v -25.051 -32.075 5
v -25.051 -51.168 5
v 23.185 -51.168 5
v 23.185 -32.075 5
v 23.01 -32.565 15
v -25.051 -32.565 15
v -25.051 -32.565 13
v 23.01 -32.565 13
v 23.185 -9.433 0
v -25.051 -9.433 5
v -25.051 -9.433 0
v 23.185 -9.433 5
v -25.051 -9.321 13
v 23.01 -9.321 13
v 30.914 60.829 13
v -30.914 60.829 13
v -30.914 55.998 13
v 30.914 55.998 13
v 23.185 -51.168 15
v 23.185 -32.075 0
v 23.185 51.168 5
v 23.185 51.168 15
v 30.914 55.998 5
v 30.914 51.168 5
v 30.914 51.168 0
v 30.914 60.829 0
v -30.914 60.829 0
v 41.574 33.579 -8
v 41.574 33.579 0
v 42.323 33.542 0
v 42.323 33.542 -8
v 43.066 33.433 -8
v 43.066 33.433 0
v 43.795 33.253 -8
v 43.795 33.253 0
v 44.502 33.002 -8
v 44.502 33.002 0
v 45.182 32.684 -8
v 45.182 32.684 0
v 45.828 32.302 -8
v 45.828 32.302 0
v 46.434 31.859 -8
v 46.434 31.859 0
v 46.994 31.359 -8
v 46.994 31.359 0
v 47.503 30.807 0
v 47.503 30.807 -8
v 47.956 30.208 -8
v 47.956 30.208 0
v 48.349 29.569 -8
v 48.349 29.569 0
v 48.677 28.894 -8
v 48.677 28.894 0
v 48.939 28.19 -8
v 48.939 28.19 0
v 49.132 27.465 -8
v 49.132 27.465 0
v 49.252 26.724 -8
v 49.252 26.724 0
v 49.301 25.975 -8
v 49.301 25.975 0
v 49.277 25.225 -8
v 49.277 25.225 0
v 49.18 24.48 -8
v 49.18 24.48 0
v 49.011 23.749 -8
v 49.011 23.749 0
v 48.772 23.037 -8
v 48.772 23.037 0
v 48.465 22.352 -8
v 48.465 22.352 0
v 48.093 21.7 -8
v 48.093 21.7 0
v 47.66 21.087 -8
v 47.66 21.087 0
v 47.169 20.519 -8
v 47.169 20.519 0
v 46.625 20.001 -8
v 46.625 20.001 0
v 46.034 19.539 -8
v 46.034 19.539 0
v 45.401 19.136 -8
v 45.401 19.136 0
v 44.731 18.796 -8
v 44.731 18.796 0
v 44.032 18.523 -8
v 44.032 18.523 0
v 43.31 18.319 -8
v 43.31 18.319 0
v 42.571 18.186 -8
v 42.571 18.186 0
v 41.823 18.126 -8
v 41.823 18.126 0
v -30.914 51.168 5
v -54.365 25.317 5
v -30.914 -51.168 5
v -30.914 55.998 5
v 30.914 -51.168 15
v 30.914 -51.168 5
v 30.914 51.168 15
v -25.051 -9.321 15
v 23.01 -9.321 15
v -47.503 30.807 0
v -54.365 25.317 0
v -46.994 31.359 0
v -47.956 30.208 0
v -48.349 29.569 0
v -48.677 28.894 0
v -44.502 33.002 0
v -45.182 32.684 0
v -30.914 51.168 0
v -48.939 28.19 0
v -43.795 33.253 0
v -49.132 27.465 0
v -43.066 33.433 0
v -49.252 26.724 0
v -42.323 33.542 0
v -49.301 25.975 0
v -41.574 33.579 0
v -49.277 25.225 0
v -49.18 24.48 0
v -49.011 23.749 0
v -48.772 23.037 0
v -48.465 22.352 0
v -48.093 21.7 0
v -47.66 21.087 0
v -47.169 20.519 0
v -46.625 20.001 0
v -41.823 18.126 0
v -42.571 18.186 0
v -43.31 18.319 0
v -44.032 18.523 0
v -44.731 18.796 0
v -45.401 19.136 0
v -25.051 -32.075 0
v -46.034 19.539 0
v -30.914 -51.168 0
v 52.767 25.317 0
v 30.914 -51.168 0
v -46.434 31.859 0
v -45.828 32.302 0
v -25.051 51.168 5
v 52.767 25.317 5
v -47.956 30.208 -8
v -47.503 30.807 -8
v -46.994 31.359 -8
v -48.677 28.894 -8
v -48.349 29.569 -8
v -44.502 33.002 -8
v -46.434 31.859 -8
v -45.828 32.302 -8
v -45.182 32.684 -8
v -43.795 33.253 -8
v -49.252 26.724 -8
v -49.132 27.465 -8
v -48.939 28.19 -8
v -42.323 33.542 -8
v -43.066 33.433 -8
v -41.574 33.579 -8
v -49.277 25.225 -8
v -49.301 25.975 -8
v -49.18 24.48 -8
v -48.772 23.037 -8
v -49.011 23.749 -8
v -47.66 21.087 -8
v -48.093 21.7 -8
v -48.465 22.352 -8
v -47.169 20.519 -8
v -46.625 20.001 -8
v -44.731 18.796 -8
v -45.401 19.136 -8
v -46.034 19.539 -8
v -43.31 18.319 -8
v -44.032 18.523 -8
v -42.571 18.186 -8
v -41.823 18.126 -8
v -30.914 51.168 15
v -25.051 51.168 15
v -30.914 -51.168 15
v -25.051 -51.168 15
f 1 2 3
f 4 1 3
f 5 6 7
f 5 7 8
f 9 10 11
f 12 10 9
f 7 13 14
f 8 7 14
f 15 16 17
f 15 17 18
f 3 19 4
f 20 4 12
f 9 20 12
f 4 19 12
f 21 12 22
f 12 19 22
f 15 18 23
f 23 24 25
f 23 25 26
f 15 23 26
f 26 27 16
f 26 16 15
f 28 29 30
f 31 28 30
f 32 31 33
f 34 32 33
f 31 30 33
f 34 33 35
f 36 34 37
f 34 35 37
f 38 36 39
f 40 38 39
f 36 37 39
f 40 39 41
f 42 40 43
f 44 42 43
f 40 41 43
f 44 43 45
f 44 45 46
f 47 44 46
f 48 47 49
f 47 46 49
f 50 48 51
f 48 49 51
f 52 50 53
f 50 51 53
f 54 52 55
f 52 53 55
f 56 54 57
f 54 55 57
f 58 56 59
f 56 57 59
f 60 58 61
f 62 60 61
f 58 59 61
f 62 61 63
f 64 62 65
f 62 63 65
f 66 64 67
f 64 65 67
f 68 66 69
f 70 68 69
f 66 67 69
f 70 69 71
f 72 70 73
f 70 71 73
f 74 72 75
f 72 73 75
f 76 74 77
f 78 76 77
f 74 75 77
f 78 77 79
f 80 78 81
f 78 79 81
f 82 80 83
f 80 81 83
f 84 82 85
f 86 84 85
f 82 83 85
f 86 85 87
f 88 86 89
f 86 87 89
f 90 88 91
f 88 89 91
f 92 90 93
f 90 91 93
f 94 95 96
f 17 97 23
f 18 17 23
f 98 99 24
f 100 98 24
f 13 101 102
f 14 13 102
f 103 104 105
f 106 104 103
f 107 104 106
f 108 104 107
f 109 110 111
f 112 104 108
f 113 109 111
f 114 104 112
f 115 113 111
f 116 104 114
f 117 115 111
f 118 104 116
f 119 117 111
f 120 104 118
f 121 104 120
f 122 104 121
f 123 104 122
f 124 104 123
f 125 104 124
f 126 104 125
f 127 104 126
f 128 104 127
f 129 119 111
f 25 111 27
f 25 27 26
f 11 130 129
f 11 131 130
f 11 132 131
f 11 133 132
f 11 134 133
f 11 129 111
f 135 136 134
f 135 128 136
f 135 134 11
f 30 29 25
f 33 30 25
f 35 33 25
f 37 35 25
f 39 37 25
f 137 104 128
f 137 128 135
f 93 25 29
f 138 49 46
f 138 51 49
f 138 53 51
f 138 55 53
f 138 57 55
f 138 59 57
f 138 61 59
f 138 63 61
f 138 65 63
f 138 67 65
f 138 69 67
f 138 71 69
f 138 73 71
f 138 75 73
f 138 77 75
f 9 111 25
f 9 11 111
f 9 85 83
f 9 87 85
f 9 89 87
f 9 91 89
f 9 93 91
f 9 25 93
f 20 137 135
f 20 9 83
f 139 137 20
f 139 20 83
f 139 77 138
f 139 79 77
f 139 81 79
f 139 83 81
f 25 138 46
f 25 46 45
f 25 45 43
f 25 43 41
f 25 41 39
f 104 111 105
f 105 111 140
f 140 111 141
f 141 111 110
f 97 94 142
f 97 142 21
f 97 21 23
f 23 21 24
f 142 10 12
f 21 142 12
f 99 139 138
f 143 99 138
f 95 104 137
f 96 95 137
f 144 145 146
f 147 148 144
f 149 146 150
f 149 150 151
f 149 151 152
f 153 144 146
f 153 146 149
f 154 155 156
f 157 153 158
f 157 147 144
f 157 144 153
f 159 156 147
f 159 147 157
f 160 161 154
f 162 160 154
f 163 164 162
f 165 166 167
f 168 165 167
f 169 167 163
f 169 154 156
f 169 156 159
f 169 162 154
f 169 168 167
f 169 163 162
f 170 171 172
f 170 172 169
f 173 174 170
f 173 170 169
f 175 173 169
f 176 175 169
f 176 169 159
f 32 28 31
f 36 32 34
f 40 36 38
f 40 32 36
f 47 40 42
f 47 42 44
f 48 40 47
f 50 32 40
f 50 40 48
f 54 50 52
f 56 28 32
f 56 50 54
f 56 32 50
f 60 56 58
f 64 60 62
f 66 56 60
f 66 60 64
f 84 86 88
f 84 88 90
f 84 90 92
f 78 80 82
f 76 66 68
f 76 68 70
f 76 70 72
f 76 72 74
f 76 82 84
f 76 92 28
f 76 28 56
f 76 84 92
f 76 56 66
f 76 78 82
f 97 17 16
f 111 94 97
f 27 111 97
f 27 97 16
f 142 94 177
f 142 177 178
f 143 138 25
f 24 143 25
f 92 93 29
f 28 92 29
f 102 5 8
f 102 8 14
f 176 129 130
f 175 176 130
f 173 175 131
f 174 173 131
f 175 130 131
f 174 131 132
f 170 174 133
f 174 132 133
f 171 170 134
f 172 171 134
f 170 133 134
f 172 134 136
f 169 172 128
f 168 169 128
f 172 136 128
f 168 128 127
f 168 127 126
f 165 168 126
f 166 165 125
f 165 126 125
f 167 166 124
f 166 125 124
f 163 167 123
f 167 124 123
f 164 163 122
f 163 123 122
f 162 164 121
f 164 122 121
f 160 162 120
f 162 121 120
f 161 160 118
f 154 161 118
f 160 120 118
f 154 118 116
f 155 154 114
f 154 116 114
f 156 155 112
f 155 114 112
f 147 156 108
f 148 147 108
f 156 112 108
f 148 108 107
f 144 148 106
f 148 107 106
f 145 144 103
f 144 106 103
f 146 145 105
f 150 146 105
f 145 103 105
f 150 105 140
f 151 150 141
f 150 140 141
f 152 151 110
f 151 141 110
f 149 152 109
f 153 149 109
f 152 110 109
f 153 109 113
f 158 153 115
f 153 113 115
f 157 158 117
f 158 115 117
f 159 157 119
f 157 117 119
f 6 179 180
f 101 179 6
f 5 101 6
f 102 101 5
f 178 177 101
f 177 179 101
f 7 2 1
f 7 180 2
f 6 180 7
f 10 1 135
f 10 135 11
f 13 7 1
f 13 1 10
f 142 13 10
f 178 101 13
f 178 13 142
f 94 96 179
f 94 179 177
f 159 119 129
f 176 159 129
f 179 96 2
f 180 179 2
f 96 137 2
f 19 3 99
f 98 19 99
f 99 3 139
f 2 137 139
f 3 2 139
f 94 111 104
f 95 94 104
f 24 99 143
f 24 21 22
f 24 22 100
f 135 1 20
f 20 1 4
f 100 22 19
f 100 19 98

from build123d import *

# Parameters (mm, degrees)
F0_W      = 61.827414
F0_H      = 102.335028
F1_DEPTH  = 5
F2_W      = 5.862944
F2_H      = 102.335028
F2_W_2    = 7.728428
F3_DEPTH  = 10
F4_W      = 61.827414
F4_H      = 9.661161
F5_DEPTH  = 5
F6_W      = 61.827414
F6_H      = 4.830581
F7_DEPTH  = 8
F8_W      = 48.236042
F8_H      = 22.642768
F9_DEPTH  = 5
F10_W     = 48.06122
F10_H     = 23.24395
F11_DEPTH = 2
F13_DEPTH = 8


with BuildPart() as f1:
    # F0 (on Top) → F1 (new body)
    with BuildSketch(Plane.XY):
        Rectangle(F0_W, F0_H)
        Polygon((-30.913707, -51.167514), (-30.913707, 51.167514), (-54.365486, 25.317261), align=None)
        Polygon((52.766502, 25.317261), (30.913707, 51.167514), (30.913707, -51.167514), align=None)
    extrude(amount=F1_DEPTH)

    # F2 (on face) → F3 (join)
    with BuildSketch(Plane.XY.offset(5)):
        with Locations((-27.982235, 0)):
            Rectangle(F2_W, F2_H)
        with Locations((27.049493, 0)):
            Rectangle(F2_W_2, F2_H)
    extrude(amount=F3_DEPTH)

    # F4 (on face) → F5 (join)
    with BuildSketch(Plane(origin=(0, 0, 0), x_dir=(1, 0, 0), z_dir=(0, 0, -1))):
        with Locations((0, -55.998094)):
            Rectangle(F4_W, F4_H)
    extrude(amount=-F5_DEPTH)

    # F6 (on face) → F7 (join)
    with BuildSketch(Plane.XY.offset(5)):
        with Locations((0, 58.413384)):
            Rectangle(F6_W, F6_H)
    extrude(amount=F7_DEPTH)

    # F8 (on face) → F9 (cut)
    with BuildSketch(Plane.XY.offset(5)):
        with Locations((-0.932742, -20.754081)):
            Rectangle(F8_W, F8_H)
    extrude(amount=-F9_DEPTH, mode=Mode.SUBTRACT)

    # F10 (on face) → F11 (join)
    with BuildSketch(Plane.XY.offset(15)):
        with Locations((-1.020153, -20.942758)):
            Rectangle(F10_W, F10_H)
    extrude(amount=-F11_DEPTH)

    # F12 (on face) → F13 (join)
    with BuildSketch(Plane(origin=(0, 0, 0), x_dir=(1, 0, 0), z_dir=(0, 0, -1))):
        with BuildLine():
            ThreePointArc((-41.82278, -18.125845), (-49.30103, -25.974858), (-41.573606, -33.578683))
            Line((-41.573606, -33.578683), (-41.82278, -18.125845))
        make_face()
        with BuildLine():
            ThreePointArc((41.573606, -33.578683), (49.30103, -25.974858), (41.82278, -18.125845))
            Line((41.82278, -18.125845), (41.573606, -33.578683))
        make_face()
    extrude(amount=F13_DEPTH)


solid = f1.part
